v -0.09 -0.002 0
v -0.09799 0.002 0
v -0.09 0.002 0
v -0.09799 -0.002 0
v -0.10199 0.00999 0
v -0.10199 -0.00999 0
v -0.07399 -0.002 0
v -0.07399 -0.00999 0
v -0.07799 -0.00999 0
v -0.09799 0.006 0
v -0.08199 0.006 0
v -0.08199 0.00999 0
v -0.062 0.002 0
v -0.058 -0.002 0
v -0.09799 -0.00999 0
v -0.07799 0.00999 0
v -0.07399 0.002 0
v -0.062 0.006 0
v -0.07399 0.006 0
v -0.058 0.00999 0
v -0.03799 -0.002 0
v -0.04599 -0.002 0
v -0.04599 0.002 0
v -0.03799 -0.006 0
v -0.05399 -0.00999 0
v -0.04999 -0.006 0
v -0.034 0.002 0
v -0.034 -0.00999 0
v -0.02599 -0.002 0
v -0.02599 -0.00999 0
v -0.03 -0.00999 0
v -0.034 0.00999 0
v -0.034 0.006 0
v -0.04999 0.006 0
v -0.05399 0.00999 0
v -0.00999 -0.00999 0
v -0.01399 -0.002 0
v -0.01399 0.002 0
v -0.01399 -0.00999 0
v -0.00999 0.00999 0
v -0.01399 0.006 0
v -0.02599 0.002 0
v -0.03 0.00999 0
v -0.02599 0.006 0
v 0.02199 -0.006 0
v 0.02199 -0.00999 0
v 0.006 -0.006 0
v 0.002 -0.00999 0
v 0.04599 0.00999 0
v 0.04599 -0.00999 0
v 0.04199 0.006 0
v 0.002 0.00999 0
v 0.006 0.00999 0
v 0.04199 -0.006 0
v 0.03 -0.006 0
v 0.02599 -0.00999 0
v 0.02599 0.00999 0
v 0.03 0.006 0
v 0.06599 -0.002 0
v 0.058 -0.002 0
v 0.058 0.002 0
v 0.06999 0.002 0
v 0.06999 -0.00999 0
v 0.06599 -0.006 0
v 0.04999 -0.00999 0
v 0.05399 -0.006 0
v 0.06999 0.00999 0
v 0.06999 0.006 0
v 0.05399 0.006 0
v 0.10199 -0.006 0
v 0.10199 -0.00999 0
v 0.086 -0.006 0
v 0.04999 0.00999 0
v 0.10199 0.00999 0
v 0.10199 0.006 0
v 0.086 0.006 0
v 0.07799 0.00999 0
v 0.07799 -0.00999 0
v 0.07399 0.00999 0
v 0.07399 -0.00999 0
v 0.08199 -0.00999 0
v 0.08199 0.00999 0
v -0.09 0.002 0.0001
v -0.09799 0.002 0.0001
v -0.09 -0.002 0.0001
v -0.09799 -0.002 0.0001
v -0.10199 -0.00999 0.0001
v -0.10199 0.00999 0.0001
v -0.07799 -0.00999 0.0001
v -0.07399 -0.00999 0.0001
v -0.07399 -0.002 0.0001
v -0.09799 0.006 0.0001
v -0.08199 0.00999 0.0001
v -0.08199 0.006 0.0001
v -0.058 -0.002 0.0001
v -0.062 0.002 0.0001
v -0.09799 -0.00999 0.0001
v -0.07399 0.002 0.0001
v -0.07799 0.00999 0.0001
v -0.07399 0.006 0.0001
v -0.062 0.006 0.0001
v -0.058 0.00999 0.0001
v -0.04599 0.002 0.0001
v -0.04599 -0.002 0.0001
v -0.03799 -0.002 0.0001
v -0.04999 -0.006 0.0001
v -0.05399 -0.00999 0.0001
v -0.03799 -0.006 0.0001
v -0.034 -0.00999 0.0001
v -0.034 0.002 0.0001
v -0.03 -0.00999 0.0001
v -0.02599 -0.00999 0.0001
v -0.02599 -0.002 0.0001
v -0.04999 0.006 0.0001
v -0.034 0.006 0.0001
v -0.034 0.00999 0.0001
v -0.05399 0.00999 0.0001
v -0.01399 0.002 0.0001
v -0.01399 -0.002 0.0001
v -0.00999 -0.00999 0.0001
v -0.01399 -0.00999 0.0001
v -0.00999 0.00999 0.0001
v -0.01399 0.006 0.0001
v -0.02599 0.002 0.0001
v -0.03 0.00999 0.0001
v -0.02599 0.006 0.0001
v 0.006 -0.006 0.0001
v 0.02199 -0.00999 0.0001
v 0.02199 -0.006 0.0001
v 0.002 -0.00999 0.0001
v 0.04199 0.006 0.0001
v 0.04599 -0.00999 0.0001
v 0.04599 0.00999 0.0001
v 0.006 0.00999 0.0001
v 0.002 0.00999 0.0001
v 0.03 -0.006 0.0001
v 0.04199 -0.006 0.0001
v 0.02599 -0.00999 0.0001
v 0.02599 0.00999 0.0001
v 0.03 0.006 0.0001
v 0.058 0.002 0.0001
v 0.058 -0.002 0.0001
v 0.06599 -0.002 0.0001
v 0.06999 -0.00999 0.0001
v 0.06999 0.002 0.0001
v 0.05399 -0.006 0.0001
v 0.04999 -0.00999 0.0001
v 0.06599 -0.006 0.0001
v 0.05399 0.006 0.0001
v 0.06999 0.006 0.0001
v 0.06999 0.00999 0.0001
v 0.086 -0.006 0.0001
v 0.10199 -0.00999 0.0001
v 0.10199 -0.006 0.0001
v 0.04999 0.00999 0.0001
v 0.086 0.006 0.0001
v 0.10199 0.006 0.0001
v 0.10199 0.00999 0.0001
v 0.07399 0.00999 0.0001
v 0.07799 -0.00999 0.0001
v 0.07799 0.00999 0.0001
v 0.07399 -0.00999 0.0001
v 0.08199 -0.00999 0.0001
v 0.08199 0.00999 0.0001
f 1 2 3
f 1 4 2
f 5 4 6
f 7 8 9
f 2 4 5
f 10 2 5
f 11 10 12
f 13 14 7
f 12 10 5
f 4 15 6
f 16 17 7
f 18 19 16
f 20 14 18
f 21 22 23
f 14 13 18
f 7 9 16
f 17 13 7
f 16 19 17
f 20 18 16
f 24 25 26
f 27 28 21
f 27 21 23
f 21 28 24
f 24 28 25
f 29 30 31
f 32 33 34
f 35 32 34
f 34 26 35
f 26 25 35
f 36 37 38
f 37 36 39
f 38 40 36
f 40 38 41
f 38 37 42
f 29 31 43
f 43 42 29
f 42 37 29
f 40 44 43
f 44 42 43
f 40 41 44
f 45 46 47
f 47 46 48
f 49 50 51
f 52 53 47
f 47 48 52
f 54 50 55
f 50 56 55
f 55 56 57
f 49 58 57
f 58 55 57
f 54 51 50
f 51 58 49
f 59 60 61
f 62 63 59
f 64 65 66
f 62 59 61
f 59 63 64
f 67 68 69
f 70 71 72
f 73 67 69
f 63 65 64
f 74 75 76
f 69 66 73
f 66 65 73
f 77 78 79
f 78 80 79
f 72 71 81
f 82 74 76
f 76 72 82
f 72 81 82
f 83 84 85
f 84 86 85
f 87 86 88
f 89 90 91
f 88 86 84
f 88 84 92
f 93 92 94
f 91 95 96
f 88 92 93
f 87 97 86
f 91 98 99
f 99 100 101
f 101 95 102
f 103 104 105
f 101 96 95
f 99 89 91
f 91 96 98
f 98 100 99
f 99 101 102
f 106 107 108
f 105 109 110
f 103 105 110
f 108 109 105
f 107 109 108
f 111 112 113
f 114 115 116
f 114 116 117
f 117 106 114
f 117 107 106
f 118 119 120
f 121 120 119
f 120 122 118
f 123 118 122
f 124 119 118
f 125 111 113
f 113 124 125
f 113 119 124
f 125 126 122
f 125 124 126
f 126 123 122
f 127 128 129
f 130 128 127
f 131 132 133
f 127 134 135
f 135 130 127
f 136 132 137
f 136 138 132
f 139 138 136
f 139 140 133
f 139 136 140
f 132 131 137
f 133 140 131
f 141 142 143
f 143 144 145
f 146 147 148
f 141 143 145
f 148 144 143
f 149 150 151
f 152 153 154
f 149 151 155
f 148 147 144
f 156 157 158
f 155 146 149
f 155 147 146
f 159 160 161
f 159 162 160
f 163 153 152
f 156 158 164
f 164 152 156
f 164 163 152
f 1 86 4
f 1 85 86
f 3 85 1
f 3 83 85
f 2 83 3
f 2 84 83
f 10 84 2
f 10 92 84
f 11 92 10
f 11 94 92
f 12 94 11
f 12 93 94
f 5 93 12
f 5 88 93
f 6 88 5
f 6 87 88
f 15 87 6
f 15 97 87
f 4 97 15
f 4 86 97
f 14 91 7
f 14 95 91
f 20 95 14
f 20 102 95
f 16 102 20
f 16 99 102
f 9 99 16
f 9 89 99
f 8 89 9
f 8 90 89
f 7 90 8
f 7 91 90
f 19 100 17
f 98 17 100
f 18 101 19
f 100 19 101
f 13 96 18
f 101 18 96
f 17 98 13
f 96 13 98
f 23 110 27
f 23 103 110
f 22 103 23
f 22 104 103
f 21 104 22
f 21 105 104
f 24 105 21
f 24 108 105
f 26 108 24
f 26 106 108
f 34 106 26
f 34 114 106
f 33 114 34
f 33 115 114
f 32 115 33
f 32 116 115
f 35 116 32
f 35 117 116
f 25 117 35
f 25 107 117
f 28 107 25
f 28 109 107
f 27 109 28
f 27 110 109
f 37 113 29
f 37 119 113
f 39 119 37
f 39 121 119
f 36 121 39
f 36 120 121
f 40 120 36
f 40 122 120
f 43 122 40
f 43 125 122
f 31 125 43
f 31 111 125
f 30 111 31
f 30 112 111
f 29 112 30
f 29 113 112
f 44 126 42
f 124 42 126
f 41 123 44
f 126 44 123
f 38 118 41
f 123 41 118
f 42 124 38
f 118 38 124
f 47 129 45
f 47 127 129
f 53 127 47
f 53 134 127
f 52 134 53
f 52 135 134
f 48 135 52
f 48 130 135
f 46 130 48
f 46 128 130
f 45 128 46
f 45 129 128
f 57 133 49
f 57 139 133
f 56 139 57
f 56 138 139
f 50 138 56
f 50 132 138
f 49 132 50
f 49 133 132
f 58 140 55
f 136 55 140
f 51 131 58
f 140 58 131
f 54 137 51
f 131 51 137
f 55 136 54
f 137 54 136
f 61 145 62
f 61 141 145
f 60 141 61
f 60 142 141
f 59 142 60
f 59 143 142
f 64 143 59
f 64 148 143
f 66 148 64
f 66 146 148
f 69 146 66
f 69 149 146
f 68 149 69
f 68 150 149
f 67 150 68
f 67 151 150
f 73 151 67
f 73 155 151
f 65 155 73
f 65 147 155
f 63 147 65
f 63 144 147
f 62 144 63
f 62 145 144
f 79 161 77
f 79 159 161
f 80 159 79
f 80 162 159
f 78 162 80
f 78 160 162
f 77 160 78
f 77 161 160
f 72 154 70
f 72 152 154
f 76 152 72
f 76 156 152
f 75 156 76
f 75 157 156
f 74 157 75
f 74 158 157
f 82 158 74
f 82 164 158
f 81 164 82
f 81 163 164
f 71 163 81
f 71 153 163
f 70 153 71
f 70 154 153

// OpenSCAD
// file: Text_shared.scad
char_width = 0.02;
char_height = 0.02;
char_depth = 0.0001;
char_spacing = 0.025;

charpt_gridx = 5;
charpt_gridy = 5;

char_pixelsz = 0.02/5;

function charpt(cx, cy) = [
  (cx-charpt_gridx/2)*char_width/charpt_gridx,
  (cy-charpt_gridy/2)*char_height/charpt_gridy,
];

function sum(list) = list * [for (_=list) 1];
function partialsum(list, end) = list * [for (i=[0:len(list)-1]) i < end ? 1 : 0];

module _Text_Line(a, b) {
  polygon([
    [min(a.x, b.x)-0.5, min(a.y, b.y)-0.5],
    [max(a.x, b.x)+0.5, min(a.y, b.y)-0.5],
    [max(a.x, b.x)+0.5, max(a.y, b.y)+0.5],
    [min(a.x, b.x)-0.5, max(a.y, b.y)+0.5],
  ]*char_pixelsz);
}

module _Text_Segments(pts, off=[0,0]) {
  for (i=[0:len(pts)-2]) {
    _Text_Line(pts[i]+off, pts[i+1]+off);
  }
}

Letter_A = [
  [-2, -2],
  [-2, 2],
  [2, 2],
  [2, -2],
  [2, 0],
  [-2, 0],
];

Letter_C = [
  [2, -2],
  [-2, -2],
  [-2, 2],
  [2, 2],
];

Letter_F = [
  [2, 2],
  [-2, 2],
  [-2, -2],
  [-2, 0],
  [0, 0],
];

Letter_G = [
  [0, 0],
  [2, 0],
  [2, -2],
  [-2, -2],
  [-2, 2],
  [2, 2],
];

Letter_I = [
  [0, -2],
  [0, 2],
];

Letter_L = [
  [-2, 2],
  [-2, -2],
  [2, -2],
];

Letter_O = [
  [-2, -2],
  [-2, 2],
  [2, 2],
  [2, -2],
  [-2, -2],
];

Letter_P = [
  [-2, -2],
  [-2, 2],
  [2, 2],
  [2, 0],
  [-2, 0],
];

module Text(letters) {
  lxs = [for (letter=letters) concat([0], [for (pt=letter) pt.x])];
  lwidths = [for (xs=lxs) max(xs)-min(xs)+1];
  lmins = [for (xs=lxs) min(xs)];
  twid = sum(lwidths) + len(letters)-1;
  startoff = (1-twid)/2;
  offs = [for (i=[0:len(letters)-1]) startoff+i+partialsum(lwidths, i)];
  linear_extrude(height=char_depth) {
    for (i=[0:len(letters)-1]) if (len(letters[i]) > 0)
      _Text_Segments(letters[i], [offs[i]-lmins[i], 0]);
  }
}
// main file
include <Text_shared.scad>;

module Text_FPGALOGIC() {
  Text([Letter_F, Letter_P, Letter_G, Letter_A, [], Letter_L, Letter_O, Letter_G, Letter_I, Letter_C]);
}

Text_FPGALOGIC();
